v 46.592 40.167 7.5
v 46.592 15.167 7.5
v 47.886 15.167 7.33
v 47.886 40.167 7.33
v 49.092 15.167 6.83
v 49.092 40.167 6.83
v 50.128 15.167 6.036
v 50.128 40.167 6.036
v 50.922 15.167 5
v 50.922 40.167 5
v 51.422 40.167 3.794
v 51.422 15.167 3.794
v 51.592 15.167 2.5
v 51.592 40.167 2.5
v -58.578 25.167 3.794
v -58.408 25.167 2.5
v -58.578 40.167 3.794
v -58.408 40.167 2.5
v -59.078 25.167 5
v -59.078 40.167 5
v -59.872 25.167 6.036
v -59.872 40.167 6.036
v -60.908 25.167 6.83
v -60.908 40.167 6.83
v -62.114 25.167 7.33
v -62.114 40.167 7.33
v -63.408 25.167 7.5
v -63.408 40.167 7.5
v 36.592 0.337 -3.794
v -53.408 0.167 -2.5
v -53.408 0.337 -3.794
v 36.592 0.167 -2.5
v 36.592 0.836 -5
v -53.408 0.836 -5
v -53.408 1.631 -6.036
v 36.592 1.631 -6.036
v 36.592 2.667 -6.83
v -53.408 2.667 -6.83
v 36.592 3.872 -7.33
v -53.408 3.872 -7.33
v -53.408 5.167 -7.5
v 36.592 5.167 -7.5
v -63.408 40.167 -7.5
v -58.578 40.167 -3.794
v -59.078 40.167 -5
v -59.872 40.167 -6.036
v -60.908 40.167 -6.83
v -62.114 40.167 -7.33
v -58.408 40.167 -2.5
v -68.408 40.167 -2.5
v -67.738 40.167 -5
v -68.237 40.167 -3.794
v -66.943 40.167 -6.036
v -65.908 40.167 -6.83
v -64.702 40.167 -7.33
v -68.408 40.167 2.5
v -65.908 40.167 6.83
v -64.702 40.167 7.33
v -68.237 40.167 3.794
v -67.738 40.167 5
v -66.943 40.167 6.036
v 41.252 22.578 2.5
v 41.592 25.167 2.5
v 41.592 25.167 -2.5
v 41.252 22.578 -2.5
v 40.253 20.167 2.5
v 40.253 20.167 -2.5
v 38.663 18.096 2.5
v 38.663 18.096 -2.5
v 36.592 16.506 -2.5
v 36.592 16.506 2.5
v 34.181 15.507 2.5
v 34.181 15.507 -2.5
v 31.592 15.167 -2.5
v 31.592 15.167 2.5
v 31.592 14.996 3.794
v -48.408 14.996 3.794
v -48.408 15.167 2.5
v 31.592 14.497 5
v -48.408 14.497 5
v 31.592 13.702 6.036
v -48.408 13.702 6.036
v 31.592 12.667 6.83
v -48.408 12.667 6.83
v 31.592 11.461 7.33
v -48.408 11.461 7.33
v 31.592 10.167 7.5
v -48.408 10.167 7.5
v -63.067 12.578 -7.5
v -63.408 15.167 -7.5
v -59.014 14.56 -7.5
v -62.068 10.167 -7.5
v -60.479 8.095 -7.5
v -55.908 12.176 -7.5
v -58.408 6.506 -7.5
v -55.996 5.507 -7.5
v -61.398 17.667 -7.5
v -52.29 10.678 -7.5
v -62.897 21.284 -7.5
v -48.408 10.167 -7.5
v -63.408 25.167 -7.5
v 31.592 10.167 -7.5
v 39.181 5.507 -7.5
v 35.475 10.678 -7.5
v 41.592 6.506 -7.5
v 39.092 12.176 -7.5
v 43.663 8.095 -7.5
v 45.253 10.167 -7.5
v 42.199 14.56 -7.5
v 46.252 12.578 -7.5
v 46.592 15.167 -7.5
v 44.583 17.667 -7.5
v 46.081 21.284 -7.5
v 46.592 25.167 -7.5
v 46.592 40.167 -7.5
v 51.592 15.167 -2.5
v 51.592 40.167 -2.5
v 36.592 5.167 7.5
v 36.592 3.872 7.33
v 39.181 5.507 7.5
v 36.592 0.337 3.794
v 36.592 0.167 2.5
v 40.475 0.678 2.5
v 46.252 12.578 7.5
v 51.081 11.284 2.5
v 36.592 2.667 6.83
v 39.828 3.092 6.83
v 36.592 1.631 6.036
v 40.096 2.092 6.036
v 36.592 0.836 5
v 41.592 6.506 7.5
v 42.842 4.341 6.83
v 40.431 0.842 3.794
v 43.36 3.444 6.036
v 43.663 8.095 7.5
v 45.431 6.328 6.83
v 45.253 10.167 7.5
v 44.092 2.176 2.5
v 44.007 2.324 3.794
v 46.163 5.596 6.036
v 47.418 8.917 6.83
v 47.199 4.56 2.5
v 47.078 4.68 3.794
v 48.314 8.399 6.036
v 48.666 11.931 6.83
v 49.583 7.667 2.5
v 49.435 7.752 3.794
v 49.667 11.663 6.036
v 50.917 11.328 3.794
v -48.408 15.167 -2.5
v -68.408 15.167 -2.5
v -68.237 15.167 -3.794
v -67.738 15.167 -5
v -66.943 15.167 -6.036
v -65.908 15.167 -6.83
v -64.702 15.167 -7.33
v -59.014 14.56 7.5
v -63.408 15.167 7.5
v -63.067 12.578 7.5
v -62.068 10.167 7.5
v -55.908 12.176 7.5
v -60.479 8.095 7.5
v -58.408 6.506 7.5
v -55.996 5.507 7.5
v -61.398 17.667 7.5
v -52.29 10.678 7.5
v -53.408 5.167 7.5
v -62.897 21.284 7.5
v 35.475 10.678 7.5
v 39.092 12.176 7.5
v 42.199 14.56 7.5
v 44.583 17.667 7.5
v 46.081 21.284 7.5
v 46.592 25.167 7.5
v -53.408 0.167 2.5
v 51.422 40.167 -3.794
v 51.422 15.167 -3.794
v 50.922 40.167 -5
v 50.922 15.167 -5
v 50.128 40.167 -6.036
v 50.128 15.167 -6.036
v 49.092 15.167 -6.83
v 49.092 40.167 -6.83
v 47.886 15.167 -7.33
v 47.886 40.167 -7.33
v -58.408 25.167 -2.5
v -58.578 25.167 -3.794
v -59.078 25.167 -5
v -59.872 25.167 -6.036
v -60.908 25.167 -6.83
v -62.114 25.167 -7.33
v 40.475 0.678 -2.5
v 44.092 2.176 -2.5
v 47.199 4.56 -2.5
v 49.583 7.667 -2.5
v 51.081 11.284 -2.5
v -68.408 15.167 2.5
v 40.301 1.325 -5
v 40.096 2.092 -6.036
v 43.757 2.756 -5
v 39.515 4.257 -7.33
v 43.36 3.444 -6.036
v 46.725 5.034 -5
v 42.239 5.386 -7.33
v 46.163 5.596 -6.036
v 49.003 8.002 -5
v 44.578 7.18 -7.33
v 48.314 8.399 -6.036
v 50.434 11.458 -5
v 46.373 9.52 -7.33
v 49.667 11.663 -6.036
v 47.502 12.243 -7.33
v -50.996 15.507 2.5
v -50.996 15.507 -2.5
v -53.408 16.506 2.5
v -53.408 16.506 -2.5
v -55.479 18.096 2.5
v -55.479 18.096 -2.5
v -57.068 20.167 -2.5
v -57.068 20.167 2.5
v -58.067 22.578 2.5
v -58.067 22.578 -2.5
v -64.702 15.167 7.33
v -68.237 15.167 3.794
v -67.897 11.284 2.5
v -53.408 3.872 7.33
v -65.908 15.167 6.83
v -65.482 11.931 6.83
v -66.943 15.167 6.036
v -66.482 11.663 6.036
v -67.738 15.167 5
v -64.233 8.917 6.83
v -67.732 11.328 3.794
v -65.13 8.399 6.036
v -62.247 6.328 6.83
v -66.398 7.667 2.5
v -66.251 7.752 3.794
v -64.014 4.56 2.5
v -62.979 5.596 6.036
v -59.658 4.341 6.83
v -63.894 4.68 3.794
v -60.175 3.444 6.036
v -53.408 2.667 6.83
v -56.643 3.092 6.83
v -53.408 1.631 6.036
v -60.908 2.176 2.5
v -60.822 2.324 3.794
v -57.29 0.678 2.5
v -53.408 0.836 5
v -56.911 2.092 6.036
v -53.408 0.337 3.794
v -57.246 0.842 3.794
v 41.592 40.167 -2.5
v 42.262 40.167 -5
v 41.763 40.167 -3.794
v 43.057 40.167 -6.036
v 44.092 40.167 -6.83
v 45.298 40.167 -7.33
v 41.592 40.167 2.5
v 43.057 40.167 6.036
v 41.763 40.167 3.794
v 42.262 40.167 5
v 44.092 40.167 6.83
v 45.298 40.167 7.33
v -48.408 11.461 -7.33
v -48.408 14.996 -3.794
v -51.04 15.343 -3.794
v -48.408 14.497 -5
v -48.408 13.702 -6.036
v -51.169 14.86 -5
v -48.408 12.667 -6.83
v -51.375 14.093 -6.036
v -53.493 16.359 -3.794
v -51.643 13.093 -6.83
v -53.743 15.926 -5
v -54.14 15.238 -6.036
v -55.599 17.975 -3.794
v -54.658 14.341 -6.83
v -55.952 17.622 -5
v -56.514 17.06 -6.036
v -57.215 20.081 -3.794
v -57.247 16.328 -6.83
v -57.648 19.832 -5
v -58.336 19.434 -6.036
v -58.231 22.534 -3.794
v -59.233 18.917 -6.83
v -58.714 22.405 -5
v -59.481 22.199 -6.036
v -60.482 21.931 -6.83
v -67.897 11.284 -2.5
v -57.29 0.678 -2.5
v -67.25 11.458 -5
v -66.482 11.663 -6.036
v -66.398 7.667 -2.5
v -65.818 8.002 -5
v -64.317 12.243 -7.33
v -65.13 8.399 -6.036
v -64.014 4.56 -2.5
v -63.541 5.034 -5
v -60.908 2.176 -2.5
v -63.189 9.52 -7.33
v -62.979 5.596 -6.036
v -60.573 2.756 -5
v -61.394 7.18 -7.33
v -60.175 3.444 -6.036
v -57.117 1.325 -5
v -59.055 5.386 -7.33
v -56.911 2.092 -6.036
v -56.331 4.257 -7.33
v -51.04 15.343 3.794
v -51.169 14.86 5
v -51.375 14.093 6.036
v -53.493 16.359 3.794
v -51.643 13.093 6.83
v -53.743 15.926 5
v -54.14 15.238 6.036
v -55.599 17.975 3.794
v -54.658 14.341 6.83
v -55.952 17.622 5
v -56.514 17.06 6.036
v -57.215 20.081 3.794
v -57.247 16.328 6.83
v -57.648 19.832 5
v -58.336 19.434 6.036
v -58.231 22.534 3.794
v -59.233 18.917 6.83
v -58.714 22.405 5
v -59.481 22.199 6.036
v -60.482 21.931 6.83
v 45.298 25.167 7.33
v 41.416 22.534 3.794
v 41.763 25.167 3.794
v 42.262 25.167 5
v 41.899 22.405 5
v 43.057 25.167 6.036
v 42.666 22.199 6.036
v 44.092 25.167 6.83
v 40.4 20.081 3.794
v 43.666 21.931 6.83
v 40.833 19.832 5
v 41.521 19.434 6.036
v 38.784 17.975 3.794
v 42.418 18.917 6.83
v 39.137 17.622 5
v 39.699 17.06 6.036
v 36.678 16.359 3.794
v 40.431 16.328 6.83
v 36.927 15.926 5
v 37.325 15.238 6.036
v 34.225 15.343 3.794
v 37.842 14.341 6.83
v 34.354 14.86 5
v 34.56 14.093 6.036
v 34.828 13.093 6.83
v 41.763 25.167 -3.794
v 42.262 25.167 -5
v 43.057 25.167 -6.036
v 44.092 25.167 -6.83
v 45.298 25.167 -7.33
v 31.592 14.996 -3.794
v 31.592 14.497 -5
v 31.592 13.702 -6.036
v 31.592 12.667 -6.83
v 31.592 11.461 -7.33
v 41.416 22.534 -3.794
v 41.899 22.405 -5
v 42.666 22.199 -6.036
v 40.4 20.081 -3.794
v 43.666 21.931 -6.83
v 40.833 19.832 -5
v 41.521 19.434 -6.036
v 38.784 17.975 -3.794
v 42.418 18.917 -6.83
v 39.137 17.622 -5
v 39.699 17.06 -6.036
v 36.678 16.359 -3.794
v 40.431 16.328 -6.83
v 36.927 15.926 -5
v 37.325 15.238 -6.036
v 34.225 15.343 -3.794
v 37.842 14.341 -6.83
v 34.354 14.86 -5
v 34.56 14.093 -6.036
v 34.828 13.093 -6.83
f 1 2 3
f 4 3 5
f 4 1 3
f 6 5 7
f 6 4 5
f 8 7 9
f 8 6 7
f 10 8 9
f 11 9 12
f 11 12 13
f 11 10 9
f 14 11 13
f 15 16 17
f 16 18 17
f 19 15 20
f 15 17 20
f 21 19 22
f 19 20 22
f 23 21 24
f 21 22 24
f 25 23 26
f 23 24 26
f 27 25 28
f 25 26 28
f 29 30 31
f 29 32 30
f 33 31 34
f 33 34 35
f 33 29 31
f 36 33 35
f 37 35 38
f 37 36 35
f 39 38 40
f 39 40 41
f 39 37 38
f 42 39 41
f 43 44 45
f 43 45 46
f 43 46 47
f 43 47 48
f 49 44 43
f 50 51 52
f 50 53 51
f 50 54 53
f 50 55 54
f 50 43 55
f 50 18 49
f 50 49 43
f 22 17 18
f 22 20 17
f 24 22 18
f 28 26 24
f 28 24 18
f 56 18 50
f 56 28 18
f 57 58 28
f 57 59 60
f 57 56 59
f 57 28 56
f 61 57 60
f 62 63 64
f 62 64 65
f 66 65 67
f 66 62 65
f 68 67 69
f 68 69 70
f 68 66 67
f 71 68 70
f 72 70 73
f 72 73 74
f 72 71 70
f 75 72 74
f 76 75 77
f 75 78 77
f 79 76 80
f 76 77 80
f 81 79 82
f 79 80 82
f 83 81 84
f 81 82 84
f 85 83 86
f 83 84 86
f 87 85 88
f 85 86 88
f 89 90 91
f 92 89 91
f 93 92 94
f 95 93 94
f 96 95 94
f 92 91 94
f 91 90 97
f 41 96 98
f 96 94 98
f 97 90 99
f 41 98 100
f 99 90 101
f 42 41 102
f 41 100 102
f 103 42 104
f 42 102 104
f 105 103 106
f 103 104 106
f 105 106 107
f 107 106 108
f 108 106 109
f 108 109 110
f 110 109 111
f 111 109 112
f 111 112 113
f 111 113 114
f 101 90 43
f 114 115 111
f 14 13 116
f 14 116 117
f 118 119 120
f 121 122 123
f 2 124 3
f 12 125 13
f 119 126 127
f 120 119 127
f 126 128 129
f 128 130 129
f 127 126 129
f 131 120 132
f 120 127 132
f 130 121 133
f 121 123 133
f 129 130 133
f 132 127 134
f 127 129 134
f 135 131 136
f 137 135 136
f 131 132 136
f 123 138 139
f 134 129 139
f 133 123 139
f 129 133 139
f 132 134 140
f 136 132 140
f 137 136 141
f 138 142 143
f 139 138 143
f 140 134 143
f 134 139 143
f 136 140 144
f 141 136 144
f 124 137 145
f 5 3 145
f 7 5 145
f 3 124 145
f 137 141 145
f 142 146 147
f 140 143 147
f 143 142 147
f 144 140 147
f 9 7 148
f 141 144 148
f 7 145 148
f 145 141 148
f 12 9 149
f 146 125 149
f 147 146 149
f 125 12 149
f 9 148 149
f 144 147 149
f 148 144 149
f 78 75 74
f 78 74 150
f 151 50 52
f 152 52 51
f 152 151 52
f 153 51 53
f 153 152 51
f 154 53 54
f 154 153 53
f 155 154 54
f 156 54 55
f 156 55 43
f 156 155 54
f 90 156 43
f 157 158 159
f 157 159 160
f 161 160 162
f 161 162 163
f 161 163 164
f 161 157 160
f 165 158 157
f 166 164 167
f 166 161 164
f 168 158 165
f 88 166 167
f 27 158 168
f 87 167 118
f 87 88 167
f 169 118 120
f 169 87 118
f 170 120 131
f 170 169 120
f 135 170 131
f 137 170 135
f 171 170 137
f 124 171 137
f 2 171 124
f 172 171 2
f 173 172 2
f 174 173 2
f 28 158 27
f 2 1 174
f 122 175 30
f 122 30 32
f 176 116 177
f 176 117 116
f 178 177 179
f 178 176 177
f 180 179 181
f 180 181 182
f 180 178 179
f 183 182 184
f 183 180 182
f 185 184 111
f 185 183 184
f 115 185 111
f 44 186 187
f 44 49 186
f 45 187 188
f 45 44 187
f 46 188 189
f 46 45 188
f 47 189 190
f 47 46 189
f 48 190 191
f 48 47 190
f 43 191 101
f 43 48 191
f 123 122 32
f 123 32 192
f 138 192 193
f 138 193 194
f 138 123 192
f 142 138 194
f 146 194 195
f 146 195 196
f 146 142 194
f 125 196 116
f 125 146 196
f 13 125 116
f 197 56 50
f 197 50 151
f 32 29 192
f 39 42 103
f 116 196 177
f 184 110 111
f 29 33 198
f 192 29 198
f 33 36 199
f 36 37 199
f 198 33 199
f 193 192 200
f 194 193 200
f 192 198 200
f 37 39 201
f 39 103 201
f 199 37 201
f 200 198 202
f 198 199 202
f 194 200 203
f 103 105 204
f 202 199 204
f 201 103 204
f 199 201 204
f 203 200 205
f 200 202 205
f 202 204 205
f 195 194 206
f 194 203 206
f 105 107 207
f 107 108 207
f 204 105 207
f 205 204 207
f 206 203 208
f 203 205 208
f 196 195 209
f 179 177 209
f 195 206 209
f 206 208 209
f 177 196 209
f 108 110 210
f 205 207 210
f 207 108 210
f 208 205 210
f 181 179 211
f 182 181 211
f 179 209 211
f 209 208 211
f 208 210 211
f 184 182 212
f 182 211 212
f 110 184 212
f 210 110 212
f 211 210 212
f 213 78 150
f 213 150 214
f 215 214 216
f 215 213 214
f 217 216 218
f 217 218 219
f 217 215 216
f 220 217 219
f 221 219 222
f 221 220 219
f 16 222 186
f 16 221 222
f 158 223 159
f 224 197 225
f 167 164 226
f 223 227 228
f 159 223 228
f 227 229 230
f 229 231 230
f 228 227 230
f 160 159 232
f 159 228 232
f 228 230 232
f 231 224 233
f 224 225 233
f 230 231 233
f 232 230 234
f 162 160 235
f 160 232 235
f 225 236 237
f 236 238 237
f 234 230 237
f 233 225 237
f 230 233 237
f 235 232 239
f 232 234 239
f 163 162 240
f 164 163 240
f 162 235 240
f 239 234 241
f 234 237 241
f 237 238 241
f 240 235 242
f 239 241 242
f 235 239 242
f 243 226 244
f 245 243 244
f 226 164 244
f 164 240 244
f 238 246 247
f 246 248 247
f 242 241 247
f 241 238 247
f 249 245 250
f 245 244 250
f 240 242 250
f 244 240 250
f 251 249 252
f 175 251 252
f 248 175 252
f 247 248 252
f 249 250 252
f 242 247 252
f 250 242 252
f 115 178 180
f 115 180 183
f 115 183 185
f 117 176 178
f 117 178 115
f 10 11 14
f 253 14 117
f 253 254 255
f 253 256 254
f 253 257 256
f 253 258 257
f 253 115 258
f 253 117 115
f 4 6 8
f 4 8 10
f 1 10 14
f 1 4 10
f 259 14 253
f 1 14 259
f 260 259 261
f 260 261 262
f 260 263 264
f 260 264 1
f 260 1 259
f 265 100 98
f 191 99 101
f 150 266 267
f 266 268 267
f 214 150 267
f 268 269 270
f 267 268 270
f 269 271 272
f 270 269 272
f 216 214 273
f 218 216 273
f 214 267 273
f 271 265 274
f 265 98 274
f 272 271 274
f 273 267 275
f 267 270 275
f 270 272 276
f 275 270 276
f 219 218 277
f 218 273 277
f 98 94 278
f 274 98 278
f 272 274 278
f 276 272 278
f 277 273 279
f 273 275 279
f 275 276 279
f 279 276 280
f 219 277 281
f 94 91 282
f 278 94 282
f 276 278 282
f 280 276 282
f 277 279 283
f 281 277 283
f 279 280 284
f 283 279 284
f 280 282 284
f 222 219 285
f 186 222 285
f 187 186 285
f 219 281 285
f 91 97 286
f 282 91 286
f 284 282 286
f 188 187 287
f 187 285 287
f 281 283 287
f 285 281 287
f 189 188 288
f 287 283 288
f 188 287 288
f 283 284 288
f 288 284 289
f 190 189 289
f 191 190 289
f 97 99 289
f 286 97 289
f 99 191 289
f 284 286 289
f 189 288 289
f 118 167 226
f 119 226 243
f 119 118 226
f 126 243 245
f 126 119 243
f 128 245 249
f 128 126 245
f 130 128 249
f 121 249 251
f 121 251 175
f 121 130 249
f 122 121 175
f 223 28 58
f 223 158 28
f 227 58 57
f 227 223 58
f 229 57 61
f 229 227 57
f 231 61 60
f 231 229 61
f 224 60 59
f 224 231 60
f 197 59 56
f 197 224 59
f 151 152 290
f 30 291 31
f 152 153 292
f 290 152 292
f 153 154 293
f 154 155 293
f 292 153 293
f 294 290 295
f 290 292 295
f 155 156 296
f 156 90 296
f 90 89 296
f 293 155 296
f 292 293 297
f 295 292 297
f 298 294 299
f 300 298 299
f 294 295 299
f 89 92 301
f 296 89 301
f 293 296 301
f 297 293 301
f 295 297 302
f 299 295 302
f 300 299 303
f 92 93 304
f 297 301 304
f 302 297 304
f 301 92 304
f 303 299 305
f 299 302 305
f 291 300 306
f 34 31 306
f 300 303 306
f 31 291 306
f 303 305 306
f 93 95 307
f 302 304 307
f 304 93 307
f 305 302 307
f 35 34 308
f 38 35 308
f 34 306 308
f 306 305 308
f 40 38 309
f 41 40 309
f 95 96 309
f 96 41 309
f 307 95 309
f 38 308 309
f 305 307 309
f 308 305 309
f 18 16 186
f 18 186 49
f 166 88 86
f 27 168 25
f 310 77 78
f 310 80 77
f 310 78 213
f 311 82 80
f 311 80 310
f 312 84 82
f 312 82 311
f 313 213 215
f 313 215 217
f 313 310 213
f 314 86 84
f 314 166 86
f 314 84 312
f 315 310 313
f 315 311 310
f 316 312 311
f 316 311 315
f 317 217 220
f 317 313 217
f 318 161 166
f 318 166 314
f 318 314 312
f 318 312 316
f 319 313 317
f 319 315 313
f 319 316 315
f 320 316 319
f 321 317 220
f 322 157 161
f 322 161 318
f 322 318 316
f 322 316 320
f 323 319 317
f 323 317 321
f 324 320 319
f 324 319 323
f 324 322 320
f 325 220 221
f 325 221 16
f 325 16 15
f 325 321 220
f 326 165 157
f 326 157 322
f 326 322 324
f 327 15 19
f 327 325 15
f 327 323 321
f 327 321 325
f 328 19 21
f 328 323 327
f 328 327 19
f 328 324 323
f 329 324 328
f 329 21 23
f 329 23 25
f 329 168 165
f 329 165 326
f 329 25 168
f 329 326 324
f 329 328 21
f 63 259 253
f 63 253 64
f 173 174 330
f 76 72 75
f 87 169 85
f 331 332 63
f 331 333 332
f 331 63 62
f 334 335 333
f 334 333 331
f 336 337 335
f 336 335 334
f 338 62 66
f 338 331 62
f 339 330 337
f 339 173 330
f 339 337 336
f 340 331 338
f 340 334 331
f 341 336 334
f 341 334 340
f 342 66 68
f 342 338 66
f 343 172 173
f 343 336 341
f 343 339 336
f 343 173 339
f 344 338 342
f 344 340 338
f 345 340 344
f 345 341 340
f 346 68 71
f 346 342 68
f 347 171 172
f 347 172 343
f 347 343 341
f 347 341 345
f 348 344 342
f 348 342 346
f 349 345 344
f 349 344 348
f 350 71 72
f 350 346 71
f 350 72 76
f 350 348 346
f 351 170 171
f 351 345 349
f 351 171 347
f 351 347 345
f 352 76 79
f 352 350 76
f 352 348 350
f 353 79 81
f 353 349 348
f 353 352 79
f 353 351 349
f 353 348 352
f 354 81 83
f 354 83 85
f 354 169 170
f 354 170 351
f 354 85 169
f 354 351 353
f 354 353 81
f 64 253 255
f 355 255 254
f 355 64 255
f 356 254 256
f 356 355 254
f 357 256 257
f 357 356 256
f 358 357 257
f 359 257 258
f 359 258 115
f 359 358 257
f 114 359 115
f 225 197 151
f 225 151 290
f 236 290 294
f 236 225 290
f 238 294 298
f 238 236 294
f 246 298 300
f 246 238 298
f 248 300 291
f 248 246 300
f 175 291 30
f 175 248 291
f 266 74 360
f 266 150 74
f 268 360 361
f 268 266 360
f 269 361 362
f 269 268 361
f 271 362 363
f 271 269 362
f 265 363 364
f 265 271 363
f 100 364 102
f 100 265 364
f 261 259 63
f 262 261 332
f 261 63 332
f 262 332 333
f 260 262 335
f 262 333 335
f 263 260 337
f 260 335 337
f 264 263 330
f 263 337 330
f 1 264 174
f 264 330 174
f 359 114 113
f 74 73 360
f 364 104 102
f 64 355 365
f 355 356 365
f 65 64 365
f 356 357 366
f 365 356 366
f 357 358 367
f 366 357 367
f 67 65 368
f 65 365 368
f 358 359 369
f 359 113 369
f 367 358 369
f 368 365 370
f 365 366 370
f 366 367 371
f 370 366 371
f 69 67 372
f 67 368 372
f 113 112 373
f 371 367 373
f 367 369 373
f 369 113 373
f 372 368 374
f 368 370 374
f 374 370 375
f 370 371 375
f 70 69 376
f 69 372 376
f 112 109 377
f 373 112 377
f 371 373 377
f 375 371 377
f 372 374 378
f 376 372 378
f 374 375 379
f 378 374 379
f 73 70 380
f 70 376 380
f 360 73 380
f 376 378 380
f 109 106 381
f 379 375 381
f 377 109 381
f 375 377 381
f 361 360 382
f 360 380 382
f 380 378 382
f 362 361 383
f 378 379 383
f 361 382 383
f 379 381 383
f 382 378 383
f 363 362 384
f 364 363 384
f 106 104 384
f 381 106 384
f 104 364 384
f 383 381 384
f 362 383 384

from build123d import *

# Parameters (mm, degrees)
F1_DEPTH = 7.5
F2_R     = 4.99999


# Not quite as in the source:
# - a fillet or chamfer is up to 0.001 mm smaller than in the source, because OpenCascade refuses the exact size


with BuildPart() as f1:
    # F0 (on Top) → F1 (new body, symmetric)
    with BuildSketch(Plane.XY):
        with BuildLine():
            ThreePointArc((-68.4076752503, 15.1665699541), (-64.0142769681, 4.5599682363), (-53.4076752503, 0.1665699541))
            Line((-53.4076752503, 0.1665699541), (36.5923247497, 0.1665699541))
            ThreePointArc((36.5923247497, 0.1665699541), (47.1989264675, 4.5599682363), (51.5923247497, 15.1665699541))
            Line((51.5923247497, 15.1665699541), (51.5923247497, 40.1665699541))
            Line((51.5923247497, 40.1665699541), (41.5923247497, 40.1665699541))
            Line((41.5923247497, 40.1665699541), (41.5923247497, 25.1665699541))
            ThreePointArc((41.5923247497, 25.1665699541), (38.6633925615, 18.0955021423), (31.5923247497, 15.1665699541))
            Line((31.5923247497, 15.1665699541), (-48.4076752503, 15.1665699541))
            ThreePointArc((-48.4076752503, 15.1665699541), (-55.4787430622, 18.0955021423), (-58.4076752503, 25.1665699541))
            Line((-58.4076752503, 25.1665699541), (-58.4076752503, 40.1665699541))
            Line((-58.4076752503, 40.1665699541), (-68.4076752503, 40.1665699541))
            Line((-68.4076752503, 40.1665699541), (-68.4076752503, 15.1665699541))
        make_face()
    extrude(amount=F1_DEPTH, both=True)

    # F2 (radius 5 in the source; OpenCascade refuses exactly that, so slightly less here)
    f2_edges = [f1.edges().sort_by_distance(p)[0] for p in [
        (-8.407675, 15.16657, 7.5),
        (-8.407675, 0.16657, 7.5),
        (-8.407675, 0.16657, -7.5),
        (-8.407675, 15.16657, -7.5),
    ]]
    fillet(f2_edges, radius=F2_R)


solid = f1.part
